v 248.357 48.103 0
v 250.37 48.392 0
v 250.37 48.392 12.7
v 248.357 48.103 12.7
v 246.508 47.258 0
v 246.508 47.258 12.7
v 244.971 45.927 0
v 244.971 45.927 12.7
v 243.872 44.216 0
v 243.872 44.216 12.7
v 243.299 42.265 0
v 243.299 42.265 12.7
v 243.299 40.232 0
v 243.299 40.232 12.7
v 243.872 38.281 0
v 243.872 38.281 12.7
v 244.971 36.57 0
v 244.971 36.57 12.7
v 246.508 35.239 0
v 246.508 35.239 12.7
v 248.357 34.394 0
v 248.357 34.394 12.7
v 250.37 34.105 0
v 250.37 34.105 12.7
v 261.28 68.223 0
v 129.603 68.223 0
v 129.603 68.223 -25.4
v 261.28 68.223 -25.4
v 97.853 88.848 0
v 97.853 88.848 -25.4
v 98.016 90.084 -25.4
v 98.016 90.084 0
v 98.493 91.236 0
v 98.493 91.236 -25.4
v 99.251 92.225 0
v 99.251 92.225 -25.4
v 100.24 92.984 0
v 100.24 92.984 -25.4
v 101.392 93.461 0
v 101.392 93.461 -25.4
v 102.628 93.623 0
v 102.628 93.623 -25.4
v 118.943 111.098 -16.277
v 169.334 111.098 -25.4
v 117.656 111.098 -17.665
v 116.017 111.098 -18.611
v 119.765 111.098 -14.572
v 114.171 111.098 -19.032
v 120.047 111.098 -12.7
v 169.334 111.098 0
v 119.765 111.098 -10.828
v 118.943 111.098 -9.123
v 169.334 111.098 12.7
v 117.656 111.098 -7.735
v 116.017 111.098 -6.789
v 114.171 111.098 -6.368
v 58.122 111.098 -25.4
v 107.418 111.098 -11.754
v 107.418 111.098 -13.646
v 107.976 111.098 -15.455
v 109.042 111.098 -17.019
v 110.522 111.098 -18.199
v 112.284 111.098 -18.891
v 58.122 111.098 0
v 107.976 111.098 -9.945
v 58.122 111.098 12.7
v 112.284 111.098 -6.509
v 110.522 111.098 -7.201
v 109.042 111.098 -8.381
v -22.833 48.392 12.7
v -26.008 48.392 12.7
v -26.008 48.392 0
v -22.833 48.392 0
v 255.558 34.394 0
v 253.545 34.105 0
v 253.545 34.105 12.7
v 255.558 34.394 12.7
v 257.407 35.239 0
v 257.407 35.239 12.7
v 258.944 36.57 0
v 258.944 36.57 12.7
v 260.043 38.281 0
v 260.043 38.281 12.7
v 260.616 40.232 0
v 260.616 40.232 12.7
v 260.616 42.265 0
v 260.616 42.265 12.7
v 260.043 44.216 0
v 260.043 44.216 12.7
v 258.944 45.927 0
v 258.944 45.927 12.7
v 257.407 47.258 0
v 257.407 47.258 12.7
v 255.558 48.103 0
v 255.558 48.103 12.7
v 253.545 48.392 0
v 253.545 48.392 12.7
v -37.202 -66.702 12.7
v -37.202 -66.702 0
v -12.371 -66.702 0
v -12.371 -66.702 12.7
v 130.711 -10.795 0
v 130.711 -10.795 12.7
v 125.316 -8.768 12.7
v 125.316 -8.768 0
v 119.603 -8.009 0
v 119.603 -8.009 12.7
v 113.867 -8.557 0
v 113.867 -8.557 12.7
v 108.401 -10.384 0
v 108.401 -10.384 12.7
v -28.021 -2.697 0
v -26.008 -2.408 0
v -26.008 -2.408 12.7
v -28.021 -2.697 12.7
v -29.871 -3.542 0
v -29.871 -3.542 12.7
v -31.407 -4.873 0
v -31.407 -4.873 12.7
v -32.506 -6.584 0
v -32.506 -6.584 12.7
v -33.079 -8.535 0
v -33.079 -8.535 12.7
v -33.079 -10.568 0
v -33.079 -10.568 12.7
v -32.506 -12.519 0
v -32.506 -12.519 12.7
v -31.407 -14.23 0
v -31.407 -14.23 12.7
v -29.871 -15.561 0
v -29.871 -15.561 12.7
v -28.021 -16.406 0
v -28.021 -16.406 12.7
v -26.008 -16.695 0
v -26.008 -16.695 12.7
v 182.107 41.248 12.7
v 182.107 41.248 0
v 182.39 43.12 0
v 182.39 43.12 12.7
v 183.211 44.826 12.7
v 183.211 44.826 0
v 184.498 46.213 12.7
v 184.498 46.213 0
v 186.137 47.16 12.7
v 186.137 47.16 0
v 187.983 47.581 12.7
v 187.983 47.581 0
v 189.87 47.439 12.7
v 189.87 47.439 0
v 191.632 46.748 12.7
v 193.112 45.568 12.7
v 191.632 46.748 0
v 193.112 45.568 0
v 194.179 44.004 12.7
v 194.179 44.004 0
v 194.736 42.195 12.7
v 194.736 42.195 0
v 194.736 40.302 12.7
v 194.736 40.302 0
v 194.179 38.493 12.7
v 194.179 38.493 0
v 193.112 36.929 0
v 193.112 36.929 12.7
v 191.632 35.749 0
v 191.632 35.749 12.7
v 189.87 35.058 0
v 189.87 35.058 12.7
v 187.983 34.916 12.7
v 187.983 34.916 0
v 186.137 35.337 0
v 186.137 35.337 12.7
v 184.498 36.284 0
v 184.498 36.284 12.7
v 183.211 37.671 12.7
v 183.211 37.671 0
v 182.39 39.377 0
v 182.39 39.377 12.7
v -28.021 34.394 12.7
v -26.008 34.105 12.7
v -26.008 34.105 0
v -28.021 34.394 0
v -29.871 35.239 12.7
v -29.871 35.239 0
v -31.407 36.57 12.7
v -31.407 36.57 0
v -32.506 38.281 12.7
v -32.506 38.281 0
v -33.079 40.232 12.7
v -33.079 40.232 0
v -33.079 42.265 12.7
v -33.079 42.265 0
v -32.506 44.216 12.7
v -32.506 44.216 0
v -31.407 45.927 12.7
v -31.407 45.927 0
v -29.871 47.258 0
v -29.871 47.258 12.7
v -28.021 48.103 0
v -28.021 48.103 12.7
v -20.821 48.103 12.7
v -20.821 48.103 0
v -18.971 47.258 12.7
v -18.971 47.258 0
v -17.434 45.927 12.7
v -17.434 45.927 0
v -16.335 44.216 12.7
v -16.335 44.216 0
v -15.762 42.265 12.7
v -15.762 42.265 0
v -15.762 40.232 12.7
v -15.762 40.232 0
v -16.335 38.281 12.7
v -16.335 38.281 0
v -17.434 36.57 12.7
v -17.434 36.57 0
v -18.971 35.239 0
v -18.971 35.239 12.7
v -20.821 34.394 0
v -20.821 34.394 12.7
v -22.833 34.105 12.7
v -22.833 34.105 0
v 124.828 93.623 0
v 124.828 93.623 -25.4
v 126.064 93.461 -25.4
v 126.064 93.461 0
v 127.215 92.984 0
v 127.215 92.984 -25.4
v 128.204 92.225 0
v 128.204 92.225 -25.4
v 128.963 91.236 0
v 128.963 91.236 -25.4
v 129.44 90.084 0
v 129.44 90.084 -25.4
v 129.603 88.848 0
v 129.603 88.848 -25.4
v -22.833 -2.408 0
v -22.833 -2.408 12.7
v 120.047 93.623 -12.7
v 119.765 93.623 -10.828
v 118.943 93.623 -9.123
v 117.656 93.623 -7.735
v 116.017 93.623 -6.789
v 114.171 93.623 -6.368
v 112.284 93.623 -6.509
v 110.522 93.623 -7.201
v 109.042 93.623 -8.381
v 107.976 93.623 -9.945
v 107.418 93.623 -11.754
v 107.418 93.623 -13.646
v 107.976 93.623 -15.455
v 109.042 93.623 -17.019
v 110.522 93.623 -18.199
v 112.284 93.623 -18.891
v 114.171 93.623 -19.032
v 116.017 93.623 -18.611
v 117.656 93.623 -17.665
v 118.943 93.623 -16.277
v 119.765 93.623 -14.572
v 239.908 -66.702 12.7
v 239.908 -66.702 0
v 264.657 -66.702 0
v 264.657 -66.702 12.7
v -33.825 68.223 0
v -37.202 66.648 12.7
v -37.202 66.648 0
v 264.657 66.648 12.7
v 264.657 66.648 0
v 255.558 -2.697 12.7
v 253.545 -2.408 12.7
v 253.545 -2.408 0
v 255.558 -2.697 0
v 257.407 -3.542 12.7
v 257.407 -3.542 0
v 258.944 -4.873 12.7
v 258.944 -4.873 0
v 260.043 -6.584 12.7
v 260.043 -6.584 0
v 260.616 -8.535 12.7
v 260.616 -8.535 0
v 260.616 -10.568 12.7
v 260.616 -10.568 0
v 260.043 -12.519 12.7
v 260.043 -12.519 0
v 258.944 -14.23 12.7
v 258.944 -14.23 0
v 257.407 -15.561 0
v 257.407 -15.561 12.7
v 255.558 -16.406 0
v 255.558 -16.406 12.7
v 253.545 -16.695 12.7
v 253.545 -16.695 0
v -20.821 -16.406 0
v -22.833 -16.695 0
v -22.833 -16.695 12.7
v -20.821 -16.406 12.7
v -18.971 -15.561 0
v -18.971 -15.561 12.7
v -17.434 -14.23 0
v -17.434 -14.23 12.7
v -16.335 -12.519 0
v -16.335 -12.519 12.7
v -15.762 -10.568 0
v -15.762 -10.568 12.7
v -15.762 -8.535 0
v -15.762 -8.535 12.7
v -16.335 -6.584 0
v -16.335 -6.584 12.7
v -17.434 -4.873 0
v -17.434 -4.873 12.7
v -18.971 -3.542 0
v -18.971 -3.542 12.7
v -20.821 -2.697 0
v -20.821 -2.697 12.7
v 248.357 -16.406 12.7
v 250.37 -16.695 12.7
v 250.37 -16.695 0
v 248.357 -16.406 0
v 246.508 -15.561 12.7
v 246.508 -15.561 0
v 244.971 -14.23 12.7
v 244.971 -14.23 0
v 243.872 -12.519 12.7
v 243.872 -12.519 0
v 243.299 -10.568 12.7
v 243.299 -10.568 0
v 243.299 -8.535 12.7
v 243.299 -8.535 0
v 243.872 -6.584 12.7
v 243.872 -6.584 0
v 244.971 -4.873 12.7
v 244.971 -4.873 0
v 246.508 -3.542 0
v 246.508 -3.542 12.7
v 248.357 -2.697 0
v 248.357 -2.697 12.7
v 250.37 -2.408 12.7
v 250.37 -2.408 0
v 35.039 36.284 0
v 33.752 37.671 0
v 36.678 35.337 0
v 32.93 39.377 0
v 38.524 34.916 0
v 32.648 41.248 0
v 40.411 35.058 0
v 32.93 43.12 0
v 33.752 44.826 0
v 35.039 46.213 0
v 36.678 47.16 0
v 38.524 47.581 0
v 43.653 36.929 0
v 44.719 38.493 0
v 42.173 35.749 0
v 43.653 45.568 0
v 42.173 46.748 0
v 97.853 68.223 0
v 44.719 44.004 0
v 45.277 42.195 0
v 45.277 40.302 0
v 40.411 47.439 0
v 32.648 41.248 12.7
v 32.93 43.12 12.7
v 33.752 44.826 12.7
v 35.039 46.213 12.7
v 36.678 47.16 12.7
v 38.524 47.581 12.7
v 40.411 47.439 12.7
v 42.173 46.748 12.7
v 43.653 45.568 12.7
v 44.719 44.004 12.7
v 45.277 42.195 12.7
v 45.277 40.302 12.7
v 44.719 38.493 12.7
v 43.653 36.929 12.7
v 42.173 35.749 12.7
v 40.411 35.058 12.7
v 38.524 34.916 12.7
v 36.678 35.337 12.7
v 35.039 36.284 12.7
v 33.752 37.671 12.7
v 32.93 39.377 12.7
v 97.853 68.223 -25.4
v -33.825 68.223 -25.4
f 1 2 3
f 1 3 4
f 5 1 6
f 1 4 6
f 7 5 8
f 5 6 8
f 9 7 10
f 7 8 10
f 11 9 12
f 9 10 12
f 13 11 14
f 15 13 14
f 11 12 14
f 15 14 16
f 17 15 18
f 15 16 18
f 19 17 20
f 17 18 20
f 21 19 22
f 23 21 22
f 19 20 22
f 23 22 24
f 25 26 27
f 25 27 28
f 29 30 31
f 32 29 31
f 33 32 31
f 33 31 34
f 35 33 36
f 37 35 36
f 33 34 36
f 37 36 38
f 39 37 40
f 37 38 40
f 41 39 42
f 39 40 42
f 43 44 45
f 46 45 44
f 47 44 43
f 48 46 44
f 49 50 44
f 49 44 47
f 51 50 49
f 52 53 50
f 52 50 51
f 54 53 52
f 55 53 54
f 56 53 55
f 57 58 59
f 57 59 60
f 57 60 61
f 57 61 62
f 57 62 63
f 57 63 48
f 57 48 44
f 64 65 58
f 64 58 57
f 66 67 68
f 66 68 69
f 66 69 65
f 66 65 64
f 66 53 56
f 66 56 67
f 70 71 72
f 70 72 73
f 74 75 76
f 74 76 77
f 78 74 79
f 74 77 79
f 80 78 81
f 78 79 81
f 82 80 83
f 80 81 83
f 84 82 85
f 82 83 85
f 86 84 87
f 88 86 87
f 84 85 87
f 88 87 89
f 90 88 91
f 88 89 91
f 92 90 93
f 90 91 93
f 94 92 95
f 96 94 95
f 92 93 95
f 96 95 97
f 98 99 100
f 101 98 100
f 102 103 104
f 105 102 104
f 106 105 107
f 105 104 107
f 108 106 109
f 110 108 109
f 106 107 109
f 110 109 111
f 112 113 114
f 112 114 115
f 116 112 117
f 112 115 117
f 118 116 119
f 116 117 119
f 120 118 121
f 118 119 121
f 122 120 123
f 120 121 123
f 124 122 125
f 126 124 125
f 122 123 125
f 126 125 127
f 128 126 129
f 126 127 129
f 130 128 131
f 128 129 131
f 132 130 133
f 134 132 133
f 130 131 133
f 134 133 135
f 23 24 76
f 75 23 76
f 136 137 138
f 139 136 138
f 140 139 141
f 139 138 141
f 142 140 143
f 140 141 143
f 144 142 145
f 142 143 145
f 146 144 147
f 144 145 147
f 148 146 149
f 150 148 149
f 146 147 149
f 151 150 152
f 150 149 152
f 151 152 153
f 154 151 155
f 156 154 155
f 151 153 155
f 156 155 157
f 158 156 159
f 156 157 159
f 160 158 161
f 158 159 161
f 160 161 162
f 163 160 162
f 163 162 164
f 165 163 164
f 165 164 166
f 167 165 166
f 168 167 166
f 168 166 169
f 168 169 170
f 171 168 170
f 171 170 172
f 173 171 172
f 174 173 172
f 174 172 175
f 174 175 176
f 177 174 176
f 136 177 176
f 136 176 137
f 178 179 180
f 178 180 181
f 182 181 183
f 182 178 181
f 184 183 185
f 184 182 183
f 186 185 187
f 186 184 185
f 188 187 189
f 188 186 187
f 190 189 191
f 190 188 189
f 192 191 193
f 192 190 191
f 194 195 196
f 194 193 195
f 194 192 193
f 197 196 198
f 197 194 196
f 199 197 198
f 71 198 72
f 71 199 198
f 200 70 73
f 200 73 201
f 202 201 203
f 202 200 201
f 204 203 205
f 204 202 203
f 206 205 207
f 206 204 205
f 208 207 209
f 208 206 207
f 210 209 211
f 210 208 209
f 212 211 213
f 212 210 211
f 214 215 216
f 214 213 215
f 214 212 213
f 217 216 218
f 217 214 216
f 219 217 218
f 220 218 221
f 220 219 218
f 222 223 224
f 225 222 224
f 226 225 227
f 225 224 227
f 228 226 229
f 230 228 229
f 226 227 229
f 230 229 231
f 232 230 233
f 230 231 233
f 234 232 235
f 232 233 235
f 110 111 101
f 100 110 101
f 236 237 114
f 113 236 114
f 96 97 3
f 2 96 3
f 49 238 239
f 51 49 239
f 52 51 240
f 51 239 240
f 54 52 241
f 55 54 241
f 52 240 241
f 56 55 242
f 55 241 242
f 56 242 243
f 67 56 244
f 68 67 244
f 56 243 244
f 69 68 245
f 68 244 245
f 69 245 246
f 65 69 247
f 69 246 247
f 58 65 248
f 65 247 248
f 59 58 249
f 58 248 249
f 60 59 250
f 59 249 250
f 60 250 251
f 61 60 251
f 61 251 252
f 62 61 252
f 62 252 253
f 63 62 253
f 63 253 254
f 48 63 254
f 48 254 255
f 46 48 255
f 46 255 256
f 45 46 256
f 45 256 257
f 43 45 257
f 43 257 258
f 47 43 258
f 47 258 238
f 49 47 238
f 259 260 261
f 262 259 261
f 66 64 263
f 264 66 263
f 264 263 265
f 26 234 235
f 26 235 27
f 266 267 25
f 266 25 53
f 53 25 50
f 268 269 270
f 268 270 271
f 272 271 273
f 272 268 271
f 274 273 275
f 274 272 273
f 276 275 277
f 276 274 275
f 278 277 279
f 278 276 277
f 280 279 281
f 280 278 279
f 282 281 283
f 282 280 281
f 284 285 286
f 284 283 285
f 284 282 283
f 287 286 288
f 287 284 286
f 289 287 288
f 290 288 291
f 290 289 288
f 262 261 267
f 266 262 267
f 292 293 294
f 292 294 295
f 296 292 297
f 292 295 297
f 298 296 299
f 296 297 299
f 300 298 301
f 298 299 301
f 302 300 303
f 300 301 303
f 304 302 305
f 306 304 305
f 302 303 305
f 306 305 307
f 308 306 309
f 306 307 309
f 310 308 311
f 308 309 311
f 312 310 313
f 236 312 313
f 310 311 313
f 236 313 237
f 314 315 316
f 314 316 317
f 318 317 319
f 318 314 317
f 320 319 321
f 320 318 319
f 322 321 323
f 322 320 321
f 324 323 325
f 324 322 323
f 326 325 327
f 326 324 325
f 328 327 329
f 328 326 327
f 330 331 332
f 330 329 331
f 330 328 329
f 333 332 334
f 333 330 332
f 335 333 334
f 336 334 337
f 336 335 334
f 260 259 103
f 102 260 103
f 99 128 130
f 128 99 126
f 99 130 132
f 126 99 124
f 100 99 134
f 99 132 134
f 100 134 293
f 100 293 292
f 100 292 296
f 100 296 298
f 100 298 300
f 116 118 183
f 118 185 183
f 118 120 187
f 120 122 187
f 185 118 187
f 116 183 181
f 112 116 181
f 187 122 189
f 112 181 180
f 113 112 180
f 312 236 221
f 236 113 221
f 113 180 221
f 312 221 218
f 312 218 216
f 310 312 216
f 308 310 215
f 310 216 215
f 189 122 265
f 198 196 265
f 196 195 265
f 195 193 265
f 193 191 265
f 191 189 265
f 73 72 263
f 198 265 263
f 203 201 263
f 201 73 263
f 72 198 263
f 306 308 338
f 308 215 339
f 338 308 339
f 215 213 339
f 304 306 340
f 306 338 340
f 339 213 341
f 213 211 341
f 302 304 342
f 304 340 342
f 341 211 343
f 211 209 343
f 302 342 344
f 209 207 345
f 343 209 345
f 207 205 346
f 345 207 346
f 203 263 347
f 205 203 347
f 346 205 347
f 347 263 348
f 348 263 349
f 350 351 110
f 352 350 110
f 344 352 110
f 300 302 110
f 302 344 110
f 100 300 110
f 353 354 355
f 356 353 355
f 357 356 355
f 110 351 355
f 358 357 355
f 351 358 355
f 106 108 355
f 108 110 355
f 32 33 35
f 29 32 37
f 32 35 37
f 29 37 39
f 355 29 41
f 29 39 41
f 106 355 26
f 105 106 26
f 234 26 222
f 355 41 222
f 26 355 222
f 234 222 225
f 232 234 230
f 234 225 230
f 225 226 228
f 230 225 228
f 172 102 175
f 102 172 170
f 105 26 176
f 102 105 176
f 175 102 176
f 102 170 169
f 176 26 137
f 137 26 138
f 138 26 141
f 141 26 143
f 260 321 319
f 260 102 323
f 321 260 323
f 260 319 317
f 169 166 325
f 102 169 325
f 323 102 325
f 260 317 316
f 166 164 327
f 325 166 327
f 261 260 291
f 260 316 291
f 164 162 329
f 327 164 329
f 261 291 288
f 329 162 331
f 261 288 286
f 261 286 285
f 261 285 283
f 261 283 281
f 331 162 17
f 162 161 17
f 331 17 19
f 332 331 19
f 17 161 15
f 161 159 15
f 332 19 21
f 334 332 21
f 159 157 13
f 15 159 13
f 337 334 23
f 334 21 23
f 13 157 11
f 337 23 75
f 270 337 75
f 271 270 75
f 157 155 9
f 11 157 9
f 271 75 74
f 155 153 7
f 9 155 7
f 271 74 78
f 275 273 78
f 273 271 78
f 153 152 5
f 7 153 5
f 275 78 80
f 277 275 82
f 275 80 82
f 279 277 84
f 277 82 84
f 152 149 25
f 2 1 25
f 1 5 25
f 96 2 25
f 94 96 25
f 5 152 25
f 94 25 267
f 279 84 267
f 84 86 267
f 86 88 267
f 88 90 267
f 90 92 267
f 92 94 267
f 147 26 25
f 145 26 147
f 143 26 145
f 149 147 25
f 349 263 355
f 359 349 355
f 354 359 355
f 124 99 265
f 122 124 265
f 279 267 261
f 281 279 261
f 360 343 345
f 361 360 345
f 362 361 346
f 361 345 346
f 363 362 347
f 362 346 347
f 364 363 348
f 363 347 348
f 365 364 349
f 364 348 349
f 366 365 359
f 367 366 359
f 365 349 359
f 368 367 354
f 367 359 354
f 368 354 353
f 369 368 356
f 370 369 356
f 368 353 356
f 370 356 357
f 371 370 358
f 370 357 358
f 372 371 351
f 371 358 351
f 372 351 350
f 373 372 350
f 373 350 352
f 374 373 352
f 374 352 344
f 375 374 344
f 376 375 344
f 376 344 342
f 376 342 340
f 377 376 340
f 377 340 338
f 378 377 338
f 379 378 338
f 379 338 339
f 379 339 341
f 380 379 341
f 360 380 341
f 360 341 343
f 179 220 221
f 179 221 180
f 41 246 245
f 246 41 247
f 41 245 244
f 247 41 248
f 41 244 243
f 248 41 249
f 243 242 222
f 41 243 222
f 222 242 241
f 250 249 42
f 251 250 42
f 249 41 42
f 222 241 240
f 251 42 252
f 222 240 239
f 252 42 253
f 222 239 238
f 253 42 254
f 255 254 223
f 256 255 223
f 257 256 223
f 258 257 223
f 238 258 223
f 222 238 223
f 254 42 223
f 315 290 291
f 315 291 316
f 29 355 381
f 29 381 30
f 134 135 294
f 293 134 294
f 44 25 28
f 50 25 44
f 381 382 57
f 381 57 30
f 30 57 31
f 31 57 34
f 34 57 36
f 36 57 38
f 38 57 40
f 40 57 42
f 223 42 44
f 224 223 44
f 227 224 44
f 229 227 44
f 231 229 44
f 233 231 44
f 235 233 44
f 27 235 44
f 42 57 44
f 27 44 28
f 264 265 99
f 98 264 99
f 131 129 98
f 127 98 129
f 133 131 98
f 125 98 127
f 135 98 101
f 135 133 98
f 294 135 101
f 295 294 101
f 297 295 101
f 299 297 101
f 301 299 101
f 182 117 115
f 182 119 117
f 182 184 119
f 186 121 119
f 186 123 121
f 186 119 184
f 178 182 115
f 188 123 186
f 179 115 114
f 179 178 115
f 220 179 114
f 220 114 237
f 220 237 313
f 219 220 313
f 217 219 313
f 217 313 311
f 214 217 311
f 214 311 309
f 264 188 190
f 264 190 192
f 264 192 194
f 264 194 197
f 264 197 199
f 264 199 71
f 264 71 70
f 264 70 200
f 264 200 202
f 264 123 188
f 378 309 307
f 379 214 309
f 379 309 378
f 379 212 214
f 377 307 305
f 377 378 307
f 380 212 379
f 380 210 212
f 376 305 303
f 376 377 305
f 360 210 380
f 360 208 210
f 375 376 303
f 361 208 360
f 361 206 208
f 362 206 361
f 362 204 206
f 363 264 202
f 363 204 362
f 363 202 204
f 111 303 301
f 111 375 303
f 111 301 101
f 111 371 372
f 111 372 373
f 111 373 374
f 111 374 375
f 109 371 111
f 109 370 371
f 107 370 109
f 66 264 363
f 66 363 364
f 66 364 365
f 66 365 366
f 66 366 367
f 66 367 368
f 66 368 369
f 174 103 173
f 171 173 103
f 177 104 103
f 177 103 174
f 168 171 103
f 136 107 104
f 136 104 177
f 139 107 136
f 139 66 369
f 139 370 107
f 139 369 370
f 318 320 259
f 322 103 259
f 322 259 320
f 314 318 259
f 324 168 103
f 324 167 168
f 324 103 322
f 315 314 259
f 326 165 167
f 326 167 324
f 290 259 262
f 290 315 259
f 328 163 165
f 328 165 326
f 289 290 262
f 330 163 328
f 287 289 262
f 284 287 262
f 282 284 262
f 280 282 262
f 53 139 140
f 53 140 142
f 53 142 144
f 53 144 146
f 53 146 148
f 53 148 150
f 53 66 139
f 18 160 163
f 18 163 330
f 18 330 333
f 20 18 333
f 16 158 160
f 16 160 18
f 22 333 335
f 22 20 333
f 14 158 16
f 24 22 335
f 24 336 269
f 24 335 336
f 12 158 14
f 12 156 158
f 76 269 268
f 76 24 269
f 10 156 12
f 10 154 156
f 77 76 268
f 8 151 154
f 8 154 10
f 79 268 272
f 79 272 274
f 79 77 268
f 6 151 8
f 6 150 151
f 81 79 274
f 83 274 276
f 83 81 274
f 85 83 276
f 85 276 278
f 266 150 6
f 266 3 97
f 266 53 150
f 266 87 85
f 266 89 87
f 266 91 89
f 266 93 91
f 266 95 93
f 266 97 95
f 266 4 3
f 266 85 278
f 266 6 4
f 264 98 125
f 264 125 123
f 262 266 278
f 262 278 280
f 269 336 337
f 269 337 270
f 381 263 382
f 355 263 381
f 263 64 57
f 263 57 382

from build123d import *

# Parameters (mm, degrees)
BASE_EXTRUDE_DEPTH             = 12.7
F_9_16_0_5625_DIAMETER_HOLE1_D = 14.2875
CUT_EXTRUDE1_DEPTH             = 13.7
BOSS_EXTRUDE1_DEPTH            = 25.4
F_1_2_20_TAPPED_HOLE1_D        = 12.7
CUT_EXTRUDE2_DEPTH             = 39.1
CUT_EXTRUDE3_DEPTH             = 39.1
F_1_2_20_TAPPED_HOLE2_D        = 12.7
CUT_EXTRUDE4_DEPTH             = 25.4


with BuildPart() as part:
    # Sketch1 → Base-Extrude (new body)
    with BuildSketch(Plane.XY):
        Polygon((58.12164787, 111.098459585), (-37.201684746, 66.648459585), (-37.201684746, -66.701540415), (264.657388756, -66.701540415), (264.657388756, 66.648459585), (169.334056139, 111.098459585), align=None)
    extrude(amount=BASE_EXTRUDE_DEPTH)

    # 9/16 (0.5625) Diameter Hole1 (through all)
    with Locations(Plane.XY.offset(12.7)):
        with Locations((251.957388756, -9.551540415), (251.957388756, 41.248459585)):
            f_9_16_0_5625_diameter_hole1 = Hole(F_9_16_0_5625_DIAMETER_HOLE1_D / 2)

    # Sketch8 → Cut-Extrude1 (cut, through all)
    with BuildSketch(Plane.XY.offset(12.7)):
        with BuildLine():
            Line((-12.371439248, -66.701540415), (239.908029755, -66.701540415))
            Line((239.908029755, -66.701540415), (130.710820593, -10.795488361))
            ThreePointArc((130.710820593, -10.795488361), (119.603489866, -8.008935492), (108.401043329, -10.384406895))
            Line((108.401043329, -10.384406895), (-12.371439248, -66.701540415))
        make_face()
    extrude(amount=-CUT_EXTRUDE1_DEPTH, mode=Mode.SUBTRACT)

    # Mirror3: 9/16 (0.5625) Diameter Hole1 across plane
    add(f_9_16_0_5625_diameter_hole1.mirror(Plane(origin=(113.768295254, 0, 0), x_dir=(0, 0, 1), z_dir=(1, 0, 0))), mode=Mode.SUBTRACT)

    # Sketch10 → Boss-Extrude1 (add)
    with BuildSketch(Plane(origin=(0, 0, 0), x_dir=(-1, 0, 0), z_dir=(0, 0, -1))):
        Polygon((-169.334056139, 111.098459585), (-58.12164787, 111.098459585), (33.824515248, 68.223259585), (-261.280219258, 68.223259585), align=None)
    extrude(amount=BOSS_EXTRUDE1_DEPTH)

    # 1/2-20 Tapped Hole1 (through all)
    with Locations(Plane(origin=(0, 111.098459585, 0), x_dir=(-1, 0, 0), z_dir=(0, 1, 0))):
        with Locations((-113.69684787, -12.7)):
            Hole(F_1_2_20_TAPPED_HOLE1_D / 2)

    # Sketch13 → Cut-Extrude2 (cut, through all)
    with BuildSketch(Plane.XY.offset(12.7)):
        with BuildLine():
            Line((250.369888756, -2.407790415), (253.544888756, -2.407790415))
            ThreePointArc((253.544888756, -2.407790415), (260.688638756, -9.551540415), (253.544888756, -16.695290415))
            Line((253.544888756, -16.695290415), (250.369888756, -16.695290415))
            ThreePointArc((250.369888756, -16.695290415), (243.226138756, -9.551540415), (250.369888756, -2.407790415))
        make_face()
    cut_extrude2 = extrude(amount=-CUT_EXTRUDE2_DEPTH, mode=Mode.SUBTRACT)

    # Sketch14 → Cut-Extrude3 (cut, through all)
    with BuildSketch(Plane.XY.offset(12.7)):
        with BuildLine():
            Line((253.544888756, 48.392209585), (250.369888756, 48.392209585))
            ThreePointArc((250.369888756, 48.392209585), (243.226138756, 41.248459585), (250.369888756, 34.104709585))
            Line((250.369888756, 34.104709585), (253.544888756, 34.104709585))
            ThreePointArc((253.544888756, 34.104709585), (260.688638756, 41.248459585), (253.544888756, 48.392209585))
        make_face()
    cut_extrude3 = extrude(amount=-CUT_EXTRUDE3_DEPTH, mode=Mode.SUBTRACT)

    # Mirror4: Cut-Extrude2, Cut-Extrude3 across plane
    add(cut_extrude2.mirror(Plane(origin=(113.768295254, 0, 0), x_dir=(0, 0, 1), z_dir=(1, 0, 0))), mode=Mode.SUBTRACT)
    add(cut_extrude3.mirror(Plane(origin=(113.768295254, 0, 0), x_dir=(0, 0, 1), z_dir=(1, 0, 0))), mode=Mode.SUBTRACT)

    # 1/2-20 Tapped Hole2 (through all)
    with Locations(Plane.XY.offset(12.7)):
        with Locations((38.998315254, 41.248459585), (188.457388756, 41.248459585)):
            Hole(F_1_2_20_TAPPED_HOLE2_D / 2)

    # Sketch17 → Cut-Extrude4 (cut)
    with BuildSketch(Plane(origin=(0, 0, -25.4), x_dir=(-1, 0, 0), z_dir=(0, 0, -1))):
        with BuildLine():
            Line((-129.602852005, 68.223259585), (-97.852852005, 68.223259585))
            Line((-97.852852005, 68.223259585), (-97.852852005, 88.848059585))
            ThreePointArc((-97.852852005, 88.848059585), (-99.251475703, 92.224635886), (-102.628052005, 93.623259585))
            Line((-102.628052005, 93.623259585), (-124.827652005, 93.623259585))
            ThreePointArc((-124.827652005, 93.623259585), (-128.204228306, 92.224635886), (-129.602852005, 88.848059585))
            Line((-129.602852005, 88.848059585), (-129.602852005, 68.223259585))
        make_face()
    extrude(amount=-CUT_EXTRUDE4_DEPTH, mode=Mode.SUBTRACT)


solid = part.part
